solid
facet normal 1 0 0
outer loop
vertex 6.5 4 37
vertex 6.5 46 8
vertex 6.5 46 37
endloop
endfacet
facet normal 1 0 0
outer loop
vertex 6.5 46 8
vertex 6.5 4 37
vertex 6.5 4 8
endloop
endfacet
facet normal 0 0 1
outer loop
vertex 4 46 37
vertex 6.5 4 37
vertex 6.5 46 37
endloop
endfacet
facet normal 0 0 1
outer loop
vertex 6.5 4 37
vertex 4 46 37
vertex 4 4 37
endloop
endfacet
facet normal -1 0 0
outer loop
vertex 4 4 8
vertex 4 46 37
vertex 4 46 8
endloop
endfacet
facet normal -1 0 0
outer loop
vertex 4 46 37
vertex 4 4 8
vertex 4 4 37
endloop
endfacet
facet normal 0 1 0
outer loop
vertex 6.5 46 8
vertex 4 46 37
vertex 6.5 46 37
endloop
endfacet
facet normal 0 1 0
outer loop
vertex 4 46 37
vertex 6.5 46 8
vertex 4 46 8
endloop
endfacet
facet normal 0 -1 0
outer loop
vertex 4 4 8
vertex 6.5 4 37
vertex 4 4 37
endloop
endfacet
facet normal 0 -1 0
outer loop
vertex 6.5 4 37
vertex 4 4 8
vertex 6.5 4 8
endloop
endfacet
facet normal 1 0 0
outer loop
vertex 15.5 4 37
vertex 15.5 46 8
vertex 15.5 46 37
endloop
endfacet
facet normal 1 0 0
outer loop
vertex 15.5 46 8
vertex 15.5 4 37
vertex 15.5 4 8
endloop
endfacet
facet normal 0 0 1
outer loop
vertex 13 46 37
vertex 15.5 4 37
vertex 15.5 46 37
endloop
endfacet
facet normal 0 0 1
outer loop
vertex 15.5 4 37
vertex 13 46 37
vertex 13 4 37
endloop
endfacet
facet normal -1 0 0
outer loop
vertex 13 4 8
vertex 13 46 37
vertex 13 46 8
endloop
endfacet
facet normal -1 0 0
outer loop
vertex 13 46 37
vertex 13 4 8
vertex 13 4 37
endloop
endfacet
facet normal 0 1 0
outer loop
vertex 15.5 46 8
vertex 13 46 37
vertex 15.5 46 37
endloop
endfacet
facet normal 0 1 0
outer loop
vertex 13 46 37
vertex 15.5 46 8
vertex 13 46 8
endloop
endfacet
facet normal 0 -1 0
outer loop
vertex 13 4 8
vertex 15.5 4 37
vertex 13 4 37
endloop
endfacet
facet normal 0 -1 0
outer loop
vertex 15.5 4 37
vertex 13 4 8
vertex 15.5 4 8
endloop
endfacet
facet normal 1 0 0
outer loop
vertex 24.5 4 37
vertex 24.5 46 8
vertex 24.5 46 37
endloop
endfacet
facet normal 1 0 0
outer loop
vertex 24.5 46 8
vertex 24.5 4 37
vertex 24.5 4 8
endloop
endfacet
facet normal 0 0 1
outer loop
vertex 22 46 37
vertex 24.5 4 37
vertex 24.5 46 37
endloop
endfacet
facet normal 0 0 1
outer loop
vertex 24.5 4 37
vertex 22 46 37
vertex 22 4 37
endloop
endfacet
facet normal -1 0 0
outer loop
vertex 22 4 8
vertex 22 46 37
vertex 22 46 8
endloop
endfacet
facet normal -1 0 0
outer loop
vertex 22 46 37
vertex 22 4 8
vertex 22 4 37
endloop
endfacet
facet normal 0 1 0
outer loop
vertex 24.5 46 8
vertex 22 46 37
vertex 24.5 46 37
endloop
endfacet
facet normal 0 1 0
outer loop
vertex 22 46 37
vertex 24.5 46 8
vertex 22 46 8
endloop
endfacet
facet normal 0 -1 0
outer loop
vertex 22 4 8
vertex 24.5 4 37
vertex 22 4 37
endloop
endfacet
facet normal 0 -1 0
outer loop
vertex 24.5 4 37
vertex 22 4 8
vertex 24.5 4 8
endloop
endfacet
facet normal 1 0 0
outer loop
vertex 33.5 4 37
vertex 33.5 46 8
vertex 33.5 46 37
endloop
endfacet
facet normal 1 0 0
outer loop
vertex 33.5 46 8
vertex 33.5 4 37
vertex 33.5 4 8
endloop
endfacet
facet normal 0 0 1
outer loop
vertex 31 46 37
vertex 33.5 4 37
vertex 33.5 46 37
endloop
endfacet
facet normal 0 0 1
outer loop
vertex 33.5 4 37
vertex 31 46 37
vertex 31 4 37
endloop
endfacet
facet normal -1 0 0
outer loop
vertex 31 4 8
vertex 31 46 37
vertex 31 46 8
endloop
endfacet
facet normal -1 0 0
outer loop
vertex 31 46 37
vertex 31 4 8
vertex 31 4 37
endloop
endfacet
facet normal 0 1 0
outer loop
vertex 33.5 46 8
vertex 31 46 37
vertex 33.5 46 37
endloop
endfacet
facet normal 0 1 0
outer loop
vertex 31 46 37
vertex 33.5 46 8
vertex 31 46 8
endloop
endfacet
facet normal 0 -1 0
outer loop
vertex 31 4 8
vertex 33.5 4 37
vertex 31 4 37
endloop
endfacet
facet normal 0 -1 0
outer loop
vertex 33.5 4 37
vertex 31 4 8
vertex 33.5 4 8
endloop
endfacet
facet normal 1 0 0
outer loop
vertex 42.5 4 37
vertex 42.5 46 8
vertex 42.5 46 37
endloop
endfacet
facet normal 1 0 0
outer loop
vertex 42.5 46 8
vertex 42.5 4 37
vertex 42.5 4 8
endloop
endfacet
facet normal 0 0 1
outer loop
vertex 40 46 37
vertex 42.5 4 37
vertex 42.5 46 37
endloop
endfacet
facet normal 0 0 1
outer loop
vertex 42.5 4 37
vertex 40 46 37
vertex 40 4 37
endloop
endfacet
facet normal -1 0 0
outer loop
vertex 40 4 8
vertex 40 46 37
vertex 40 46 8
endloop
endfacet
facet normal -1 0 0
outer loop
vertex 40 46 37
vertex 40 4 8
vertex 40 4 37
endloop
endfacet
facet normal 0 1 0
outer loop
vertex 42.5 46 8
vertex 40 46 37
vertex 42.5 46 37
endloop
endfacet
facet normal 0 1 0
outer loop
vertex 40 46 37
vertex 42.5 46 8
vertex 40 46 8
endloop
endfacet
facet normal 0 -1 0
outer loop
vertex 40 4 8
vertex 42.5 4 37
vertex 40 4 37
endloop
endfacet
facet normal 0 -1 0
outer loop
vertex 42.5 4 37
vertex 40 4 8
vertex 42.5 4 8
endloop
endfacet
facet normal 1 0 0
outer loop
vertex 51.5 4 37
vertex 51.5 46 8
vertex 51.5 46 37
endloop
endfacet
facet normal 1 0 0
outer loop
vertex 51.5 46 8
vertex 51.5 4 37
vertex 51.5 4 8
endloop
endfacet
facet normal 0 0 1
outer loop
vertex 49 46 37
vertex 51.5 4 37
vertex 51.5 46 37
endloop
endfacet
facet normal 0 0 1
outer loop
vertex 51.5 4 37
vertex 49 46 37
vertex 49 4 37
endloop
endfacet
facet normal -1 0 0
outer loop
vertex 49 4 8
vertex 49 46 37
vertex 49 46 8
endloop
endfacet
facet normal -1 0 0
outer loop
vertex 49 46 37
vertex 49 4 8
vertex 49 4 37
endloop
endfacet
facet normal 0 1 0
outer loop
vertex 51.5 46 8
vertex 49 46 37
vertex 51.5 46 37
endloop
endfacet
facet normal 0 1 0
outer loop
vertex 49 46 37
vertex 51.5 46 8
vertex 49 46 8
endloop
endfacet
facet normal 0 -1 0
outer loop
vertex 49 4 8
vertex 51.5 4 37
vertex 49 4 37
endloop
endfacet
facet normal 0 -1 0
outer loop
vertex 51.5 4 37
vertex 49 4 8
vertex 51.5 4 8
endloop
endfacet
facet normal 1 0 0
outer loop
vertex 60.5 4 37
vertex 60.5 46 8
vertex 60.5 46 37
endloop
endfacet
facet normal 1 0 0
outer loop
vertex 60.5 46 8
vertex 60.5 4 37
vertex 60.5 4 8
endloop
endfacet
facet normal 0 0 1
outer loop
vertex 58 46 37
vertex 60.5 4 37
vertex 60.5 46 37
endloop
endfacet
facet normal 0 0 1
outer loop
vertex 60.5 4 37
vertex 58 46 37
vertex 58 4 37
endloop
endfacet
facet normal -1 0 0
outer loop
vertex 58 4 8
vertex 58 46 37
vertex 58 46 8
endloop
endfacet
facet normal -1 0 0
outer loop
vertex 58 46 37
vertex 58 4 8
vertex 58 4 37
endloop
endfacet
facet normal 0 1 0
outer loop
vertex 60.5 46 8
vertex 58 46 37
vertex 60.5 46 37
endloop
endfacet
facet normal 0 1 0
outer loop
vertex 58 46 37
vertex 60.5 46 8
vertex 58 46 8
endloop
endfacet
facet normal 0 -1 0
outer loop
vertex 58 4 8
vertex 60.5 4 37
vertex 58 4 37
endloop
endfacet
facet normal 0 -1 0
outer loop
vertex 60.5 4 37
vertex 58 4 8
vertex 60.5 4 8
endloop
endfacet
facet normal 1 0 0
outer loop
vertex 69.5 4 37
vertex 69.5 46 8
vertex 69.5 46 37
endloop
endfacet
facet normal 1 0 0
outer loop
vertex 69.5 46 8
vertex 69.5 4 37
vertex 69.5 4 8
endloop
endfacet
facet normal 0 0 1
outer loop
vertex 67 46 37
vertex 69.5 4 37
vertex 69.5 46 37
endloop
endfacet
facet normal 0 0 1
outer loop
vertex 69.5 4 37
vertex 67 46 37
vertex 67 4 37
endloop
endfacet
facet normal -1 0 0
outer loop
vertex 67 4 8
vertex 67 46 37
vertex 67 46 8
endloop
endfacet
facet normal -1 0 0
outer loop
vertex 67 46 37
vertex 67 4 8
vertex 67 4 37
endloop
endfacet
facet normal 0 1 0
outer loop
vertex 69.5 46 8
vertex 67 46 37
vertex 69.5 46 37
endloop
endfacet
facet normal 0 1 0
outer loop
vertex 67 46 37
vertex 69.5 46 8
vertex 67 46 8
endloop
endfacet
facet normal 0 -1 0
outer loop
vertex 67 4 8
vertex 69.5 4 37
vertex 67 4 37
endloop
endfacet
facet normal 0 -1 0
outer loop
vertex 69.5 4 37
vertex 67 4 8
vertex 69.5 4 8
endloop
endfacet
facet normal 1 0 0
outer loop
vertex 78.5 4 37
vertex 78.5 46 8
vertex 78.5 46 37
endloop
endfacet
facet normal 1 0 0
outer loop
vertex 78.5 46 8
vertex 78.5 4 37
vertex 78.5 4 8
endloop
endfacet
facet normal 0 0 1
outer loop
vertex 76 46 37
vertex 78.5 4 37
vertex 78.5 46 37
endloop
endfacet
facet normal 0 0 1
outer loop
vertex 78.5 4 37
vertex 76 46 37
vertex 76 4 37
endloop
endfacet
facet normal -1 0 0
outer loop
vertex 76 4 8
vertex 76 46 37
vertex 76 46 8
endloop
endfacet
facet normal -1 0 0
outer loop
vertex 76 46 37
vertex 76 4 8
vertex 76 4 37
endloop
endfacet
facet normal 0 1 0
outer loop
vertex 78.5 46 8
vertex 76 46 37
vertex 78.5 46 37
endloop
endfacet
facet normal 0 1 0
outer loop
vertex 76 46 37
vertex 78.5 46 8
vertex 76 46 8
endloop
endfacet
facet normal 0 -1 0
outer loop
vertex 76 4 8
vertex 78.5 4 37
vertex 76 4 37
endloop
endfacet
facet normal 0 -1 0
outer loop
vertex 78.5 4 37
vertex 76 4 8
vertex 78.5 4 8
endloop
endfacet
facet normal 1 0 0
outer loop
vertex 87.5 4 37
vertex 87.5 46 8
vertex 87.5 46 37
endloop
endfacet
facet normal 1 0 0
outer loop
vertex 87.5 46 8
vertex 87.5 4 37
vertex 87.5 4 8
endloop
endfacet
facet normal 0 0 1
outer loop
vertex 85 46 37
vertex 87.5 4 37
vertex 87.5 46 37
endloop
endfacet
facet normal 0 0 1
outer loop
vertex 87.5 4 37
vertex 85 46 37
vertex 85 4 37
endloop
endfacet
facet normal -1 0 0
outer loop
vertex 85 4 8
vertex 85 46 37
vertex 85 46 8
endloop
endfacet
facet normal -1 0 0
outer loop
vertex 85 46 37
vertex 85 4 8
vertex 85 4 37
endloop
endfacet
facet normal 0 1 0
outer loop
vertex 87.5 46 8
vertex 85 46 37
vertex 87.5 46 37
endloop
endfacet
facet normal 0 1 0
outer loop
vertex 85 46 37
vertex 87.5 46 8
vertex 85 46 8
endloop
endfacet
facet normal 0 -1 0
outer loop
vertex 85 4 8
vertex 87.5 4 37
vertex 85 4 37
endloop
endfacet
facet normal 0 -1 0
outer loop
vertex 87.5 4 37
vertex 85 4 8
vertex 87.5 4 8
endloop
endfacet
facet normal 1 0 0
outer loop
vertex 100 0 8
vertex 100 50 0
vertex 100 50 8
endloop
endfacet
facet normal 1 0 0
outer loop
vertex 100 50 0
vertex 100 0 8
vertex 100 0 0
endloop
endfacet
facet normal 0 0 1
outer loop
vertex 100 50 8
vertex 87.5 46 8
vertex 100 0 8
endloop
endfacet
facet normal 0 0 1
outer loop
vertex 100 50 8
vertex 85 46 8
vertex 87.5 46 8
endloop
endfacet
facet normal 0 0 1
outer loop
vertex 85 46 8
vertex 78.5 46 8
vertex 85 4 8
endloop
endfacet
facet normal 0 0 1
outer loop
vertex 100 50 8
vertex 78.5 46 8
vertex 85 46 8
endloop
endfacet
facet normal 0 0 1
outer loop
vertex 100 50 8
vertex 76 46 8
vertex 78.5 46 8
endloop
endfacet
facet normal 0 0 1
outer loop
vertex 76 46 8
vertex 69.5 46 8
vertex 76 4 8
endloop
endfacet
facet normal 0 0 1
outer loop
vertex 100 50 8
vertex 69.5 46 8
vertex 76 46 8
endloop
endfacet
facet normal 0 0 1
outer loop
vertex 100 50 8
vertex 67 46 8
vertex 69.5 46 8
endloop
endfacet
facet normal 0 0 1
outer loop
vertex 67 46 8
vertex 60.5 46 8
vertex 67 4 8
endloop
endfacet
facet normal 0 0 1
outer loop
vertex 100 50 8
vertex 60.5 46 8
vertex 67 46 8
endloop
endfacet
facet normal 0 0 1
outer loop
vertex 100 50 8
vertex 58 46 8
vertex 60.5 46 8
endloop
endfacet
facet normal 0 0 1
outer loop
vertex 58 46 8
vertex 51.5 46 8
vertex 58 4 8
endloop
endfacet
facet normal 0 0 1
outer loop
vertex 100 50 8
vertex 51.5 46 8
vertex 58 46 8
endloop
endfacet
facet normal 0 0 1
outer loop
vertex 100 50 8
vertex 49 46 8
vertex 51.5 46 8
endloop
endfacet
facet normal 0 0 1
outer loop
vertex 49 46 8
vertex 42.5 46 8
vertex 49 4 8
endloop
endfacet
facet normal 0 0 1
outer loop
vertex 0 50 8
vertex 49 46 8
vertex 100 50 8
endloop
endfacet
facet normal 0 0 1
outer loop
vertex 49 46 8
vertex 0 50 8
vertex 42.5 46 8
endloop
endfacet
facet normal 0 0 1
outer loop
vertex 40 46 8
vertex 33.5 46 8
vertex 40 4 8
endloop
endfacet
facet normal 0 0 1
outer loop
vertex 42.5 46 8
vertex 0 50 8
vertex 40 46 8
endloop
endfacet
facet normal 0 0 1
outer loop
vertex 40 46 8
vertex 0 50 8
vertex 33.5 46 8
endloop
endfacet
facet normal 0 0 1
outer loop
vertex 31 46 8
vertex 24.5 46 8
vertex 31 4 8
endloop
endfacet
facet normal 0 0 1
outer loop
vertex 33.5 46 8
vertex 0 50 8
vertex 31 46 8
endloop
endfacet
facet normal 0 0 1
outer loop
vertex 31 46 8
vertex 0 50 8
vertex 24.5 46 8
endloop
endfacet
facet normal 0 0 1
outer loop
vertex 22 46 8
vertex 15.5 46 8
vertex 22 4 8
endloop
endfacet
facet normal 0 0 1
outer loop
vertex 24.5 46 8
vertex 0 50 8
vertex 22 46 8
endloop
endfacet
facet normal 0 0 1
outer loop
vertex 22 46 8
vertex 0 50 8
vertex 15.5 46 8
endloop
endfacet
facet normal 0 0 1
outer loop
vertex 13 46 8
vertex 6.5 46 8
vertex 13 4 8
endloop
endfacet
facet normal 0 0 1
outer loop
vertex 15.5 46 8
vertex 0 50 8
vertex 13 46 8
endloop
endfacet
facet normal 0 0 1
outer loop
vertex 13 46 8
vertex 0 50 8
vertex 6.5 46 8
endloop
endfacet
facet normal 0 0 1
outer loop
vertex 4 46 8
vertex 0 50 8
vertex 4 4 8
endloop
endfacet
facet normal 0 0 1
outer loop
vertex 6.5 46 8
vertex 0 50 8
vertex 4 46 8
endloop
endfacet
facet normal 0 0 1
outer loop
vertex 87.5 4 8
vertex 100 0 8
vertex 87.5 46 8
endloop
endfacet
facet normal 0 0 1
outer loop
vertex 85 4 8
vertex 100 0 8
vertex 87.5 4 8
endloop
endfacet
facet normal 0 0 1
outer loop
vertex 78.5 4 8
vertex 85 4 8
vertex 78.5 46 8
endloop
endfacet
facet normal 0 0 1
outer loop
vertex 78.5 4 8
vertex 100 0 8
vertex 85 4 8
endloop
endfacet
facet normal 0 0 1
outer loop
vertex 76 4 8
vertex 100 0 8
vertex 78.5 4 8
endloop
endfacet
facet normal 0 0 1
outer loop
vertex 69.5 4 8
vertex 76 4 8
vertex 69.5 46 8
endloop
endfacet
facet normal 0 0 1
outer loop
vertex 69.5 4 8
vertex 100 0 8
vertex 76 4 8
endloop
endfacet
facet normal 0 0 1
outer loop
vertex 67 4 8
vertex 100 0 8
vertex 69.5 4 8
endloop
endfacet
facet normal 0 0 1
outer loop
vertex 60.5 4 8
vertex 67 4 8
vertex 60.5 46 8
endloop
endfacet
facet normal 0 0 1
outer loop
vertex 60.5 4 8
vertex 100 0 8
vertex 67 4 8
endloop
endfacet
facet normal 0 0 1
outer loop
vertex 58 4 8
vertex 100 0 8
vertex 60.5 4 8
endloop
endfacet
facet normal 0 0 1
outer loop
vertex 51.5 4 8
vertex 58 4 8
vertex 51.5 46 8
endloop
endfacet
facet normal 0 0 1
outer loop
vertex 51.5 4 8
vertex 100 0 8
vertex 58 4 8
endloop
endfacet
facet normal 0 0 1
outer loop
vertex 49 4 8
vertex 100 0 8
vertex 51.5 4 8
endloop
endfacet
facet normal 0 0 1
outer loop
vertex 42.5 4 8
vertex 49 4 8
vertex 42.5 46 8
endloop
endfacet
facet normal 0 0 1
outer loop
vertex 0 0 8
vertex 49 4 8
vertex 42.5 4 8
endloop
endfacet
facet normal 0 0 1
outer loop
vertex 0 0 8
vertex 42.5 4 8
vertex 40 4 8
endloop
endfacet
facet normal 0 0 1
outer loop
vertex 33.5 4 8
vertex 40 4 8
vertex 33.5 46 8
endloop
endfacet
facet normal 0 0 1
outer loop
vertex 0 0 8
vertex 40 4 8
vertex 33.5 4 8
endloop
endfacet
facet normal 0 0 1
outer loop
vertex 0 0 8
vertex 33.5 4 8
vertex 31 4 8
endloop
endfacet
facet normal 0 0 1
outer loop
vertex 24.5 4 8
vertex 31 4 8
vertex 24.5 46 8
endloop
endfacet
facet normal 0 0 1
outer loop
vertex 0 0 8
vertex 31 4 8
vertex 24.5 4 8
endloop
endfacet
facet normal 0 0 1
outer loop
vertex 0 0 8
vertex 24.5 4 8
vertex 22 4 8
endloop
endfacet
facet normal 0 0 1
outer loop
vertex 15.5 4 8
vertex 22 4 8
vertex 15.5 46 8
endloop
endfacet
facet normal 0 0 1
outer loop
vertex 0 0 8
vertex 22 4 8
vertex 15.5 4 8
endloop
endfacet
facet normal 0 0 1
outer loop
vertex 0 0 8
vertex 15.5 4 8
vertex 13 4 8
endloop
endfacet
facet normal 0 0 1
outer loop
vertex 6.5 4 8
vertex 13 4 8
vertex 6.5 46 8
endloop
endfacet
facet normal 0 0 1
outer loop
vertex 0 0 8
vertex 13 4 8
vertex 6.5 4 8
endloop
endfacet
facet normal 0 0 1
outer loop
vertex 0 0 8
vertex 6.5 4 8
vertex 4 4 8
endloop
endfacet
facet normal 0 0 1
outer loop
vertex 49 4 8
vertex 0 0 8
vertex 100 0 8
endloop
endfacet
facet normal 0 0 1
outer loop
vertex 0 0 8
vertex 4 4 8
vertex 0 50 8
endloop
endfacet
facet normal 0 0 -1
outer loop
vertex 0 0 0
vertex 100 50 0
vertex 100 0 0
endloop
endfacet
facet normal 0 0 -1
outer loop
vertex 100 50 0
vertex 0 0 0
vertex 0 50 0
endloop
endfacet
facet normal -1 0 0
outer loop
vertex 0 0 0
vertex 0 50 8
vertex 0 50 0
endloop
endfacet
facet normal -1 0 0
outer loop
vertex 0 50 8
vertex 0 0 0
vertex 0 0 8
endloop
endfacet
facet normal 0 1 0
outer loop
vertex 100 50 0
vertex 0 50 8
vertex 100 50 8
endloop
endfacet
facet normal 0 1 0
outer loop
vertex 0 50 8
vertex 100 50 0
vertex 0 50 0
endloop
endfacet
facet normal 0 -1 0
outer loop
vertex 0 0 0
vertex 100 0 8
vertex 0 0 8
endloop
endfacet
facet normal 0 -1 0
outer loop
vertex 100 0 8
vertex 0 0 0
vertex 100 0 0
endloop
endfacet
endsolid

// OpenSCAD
$fn = 32;

// ----------------------------------------------------------------------
// Heatsink: uniform fin block
// ----------------------------------------------------------------------

// --- parameters (mm) ---
base_l = 100;             // base length, X
base_w = 50;              // base width, Y
base_t = 8;               // base plate thickness
fin_h = 30;               // fin height above the base
fin_t = 2.5;              // fin thickness
edge = 4;                 // margin from the base ends
pitch = 9;                // fin pitch

n_fins = floor((base_l - 2 * edge - fin_t) / pitch) + 1;  // fin count
total_h = base_t + fin_h - 1;  // overall height

union() {
  cube([base_l, base_w, base_t]);
  for (i = [0 : n_fins - 1])
    translate([edge + i * pitch, edge, base_t - 1])
      cube([fin_t, base_w - 2 * edge, fin_h]);
}
